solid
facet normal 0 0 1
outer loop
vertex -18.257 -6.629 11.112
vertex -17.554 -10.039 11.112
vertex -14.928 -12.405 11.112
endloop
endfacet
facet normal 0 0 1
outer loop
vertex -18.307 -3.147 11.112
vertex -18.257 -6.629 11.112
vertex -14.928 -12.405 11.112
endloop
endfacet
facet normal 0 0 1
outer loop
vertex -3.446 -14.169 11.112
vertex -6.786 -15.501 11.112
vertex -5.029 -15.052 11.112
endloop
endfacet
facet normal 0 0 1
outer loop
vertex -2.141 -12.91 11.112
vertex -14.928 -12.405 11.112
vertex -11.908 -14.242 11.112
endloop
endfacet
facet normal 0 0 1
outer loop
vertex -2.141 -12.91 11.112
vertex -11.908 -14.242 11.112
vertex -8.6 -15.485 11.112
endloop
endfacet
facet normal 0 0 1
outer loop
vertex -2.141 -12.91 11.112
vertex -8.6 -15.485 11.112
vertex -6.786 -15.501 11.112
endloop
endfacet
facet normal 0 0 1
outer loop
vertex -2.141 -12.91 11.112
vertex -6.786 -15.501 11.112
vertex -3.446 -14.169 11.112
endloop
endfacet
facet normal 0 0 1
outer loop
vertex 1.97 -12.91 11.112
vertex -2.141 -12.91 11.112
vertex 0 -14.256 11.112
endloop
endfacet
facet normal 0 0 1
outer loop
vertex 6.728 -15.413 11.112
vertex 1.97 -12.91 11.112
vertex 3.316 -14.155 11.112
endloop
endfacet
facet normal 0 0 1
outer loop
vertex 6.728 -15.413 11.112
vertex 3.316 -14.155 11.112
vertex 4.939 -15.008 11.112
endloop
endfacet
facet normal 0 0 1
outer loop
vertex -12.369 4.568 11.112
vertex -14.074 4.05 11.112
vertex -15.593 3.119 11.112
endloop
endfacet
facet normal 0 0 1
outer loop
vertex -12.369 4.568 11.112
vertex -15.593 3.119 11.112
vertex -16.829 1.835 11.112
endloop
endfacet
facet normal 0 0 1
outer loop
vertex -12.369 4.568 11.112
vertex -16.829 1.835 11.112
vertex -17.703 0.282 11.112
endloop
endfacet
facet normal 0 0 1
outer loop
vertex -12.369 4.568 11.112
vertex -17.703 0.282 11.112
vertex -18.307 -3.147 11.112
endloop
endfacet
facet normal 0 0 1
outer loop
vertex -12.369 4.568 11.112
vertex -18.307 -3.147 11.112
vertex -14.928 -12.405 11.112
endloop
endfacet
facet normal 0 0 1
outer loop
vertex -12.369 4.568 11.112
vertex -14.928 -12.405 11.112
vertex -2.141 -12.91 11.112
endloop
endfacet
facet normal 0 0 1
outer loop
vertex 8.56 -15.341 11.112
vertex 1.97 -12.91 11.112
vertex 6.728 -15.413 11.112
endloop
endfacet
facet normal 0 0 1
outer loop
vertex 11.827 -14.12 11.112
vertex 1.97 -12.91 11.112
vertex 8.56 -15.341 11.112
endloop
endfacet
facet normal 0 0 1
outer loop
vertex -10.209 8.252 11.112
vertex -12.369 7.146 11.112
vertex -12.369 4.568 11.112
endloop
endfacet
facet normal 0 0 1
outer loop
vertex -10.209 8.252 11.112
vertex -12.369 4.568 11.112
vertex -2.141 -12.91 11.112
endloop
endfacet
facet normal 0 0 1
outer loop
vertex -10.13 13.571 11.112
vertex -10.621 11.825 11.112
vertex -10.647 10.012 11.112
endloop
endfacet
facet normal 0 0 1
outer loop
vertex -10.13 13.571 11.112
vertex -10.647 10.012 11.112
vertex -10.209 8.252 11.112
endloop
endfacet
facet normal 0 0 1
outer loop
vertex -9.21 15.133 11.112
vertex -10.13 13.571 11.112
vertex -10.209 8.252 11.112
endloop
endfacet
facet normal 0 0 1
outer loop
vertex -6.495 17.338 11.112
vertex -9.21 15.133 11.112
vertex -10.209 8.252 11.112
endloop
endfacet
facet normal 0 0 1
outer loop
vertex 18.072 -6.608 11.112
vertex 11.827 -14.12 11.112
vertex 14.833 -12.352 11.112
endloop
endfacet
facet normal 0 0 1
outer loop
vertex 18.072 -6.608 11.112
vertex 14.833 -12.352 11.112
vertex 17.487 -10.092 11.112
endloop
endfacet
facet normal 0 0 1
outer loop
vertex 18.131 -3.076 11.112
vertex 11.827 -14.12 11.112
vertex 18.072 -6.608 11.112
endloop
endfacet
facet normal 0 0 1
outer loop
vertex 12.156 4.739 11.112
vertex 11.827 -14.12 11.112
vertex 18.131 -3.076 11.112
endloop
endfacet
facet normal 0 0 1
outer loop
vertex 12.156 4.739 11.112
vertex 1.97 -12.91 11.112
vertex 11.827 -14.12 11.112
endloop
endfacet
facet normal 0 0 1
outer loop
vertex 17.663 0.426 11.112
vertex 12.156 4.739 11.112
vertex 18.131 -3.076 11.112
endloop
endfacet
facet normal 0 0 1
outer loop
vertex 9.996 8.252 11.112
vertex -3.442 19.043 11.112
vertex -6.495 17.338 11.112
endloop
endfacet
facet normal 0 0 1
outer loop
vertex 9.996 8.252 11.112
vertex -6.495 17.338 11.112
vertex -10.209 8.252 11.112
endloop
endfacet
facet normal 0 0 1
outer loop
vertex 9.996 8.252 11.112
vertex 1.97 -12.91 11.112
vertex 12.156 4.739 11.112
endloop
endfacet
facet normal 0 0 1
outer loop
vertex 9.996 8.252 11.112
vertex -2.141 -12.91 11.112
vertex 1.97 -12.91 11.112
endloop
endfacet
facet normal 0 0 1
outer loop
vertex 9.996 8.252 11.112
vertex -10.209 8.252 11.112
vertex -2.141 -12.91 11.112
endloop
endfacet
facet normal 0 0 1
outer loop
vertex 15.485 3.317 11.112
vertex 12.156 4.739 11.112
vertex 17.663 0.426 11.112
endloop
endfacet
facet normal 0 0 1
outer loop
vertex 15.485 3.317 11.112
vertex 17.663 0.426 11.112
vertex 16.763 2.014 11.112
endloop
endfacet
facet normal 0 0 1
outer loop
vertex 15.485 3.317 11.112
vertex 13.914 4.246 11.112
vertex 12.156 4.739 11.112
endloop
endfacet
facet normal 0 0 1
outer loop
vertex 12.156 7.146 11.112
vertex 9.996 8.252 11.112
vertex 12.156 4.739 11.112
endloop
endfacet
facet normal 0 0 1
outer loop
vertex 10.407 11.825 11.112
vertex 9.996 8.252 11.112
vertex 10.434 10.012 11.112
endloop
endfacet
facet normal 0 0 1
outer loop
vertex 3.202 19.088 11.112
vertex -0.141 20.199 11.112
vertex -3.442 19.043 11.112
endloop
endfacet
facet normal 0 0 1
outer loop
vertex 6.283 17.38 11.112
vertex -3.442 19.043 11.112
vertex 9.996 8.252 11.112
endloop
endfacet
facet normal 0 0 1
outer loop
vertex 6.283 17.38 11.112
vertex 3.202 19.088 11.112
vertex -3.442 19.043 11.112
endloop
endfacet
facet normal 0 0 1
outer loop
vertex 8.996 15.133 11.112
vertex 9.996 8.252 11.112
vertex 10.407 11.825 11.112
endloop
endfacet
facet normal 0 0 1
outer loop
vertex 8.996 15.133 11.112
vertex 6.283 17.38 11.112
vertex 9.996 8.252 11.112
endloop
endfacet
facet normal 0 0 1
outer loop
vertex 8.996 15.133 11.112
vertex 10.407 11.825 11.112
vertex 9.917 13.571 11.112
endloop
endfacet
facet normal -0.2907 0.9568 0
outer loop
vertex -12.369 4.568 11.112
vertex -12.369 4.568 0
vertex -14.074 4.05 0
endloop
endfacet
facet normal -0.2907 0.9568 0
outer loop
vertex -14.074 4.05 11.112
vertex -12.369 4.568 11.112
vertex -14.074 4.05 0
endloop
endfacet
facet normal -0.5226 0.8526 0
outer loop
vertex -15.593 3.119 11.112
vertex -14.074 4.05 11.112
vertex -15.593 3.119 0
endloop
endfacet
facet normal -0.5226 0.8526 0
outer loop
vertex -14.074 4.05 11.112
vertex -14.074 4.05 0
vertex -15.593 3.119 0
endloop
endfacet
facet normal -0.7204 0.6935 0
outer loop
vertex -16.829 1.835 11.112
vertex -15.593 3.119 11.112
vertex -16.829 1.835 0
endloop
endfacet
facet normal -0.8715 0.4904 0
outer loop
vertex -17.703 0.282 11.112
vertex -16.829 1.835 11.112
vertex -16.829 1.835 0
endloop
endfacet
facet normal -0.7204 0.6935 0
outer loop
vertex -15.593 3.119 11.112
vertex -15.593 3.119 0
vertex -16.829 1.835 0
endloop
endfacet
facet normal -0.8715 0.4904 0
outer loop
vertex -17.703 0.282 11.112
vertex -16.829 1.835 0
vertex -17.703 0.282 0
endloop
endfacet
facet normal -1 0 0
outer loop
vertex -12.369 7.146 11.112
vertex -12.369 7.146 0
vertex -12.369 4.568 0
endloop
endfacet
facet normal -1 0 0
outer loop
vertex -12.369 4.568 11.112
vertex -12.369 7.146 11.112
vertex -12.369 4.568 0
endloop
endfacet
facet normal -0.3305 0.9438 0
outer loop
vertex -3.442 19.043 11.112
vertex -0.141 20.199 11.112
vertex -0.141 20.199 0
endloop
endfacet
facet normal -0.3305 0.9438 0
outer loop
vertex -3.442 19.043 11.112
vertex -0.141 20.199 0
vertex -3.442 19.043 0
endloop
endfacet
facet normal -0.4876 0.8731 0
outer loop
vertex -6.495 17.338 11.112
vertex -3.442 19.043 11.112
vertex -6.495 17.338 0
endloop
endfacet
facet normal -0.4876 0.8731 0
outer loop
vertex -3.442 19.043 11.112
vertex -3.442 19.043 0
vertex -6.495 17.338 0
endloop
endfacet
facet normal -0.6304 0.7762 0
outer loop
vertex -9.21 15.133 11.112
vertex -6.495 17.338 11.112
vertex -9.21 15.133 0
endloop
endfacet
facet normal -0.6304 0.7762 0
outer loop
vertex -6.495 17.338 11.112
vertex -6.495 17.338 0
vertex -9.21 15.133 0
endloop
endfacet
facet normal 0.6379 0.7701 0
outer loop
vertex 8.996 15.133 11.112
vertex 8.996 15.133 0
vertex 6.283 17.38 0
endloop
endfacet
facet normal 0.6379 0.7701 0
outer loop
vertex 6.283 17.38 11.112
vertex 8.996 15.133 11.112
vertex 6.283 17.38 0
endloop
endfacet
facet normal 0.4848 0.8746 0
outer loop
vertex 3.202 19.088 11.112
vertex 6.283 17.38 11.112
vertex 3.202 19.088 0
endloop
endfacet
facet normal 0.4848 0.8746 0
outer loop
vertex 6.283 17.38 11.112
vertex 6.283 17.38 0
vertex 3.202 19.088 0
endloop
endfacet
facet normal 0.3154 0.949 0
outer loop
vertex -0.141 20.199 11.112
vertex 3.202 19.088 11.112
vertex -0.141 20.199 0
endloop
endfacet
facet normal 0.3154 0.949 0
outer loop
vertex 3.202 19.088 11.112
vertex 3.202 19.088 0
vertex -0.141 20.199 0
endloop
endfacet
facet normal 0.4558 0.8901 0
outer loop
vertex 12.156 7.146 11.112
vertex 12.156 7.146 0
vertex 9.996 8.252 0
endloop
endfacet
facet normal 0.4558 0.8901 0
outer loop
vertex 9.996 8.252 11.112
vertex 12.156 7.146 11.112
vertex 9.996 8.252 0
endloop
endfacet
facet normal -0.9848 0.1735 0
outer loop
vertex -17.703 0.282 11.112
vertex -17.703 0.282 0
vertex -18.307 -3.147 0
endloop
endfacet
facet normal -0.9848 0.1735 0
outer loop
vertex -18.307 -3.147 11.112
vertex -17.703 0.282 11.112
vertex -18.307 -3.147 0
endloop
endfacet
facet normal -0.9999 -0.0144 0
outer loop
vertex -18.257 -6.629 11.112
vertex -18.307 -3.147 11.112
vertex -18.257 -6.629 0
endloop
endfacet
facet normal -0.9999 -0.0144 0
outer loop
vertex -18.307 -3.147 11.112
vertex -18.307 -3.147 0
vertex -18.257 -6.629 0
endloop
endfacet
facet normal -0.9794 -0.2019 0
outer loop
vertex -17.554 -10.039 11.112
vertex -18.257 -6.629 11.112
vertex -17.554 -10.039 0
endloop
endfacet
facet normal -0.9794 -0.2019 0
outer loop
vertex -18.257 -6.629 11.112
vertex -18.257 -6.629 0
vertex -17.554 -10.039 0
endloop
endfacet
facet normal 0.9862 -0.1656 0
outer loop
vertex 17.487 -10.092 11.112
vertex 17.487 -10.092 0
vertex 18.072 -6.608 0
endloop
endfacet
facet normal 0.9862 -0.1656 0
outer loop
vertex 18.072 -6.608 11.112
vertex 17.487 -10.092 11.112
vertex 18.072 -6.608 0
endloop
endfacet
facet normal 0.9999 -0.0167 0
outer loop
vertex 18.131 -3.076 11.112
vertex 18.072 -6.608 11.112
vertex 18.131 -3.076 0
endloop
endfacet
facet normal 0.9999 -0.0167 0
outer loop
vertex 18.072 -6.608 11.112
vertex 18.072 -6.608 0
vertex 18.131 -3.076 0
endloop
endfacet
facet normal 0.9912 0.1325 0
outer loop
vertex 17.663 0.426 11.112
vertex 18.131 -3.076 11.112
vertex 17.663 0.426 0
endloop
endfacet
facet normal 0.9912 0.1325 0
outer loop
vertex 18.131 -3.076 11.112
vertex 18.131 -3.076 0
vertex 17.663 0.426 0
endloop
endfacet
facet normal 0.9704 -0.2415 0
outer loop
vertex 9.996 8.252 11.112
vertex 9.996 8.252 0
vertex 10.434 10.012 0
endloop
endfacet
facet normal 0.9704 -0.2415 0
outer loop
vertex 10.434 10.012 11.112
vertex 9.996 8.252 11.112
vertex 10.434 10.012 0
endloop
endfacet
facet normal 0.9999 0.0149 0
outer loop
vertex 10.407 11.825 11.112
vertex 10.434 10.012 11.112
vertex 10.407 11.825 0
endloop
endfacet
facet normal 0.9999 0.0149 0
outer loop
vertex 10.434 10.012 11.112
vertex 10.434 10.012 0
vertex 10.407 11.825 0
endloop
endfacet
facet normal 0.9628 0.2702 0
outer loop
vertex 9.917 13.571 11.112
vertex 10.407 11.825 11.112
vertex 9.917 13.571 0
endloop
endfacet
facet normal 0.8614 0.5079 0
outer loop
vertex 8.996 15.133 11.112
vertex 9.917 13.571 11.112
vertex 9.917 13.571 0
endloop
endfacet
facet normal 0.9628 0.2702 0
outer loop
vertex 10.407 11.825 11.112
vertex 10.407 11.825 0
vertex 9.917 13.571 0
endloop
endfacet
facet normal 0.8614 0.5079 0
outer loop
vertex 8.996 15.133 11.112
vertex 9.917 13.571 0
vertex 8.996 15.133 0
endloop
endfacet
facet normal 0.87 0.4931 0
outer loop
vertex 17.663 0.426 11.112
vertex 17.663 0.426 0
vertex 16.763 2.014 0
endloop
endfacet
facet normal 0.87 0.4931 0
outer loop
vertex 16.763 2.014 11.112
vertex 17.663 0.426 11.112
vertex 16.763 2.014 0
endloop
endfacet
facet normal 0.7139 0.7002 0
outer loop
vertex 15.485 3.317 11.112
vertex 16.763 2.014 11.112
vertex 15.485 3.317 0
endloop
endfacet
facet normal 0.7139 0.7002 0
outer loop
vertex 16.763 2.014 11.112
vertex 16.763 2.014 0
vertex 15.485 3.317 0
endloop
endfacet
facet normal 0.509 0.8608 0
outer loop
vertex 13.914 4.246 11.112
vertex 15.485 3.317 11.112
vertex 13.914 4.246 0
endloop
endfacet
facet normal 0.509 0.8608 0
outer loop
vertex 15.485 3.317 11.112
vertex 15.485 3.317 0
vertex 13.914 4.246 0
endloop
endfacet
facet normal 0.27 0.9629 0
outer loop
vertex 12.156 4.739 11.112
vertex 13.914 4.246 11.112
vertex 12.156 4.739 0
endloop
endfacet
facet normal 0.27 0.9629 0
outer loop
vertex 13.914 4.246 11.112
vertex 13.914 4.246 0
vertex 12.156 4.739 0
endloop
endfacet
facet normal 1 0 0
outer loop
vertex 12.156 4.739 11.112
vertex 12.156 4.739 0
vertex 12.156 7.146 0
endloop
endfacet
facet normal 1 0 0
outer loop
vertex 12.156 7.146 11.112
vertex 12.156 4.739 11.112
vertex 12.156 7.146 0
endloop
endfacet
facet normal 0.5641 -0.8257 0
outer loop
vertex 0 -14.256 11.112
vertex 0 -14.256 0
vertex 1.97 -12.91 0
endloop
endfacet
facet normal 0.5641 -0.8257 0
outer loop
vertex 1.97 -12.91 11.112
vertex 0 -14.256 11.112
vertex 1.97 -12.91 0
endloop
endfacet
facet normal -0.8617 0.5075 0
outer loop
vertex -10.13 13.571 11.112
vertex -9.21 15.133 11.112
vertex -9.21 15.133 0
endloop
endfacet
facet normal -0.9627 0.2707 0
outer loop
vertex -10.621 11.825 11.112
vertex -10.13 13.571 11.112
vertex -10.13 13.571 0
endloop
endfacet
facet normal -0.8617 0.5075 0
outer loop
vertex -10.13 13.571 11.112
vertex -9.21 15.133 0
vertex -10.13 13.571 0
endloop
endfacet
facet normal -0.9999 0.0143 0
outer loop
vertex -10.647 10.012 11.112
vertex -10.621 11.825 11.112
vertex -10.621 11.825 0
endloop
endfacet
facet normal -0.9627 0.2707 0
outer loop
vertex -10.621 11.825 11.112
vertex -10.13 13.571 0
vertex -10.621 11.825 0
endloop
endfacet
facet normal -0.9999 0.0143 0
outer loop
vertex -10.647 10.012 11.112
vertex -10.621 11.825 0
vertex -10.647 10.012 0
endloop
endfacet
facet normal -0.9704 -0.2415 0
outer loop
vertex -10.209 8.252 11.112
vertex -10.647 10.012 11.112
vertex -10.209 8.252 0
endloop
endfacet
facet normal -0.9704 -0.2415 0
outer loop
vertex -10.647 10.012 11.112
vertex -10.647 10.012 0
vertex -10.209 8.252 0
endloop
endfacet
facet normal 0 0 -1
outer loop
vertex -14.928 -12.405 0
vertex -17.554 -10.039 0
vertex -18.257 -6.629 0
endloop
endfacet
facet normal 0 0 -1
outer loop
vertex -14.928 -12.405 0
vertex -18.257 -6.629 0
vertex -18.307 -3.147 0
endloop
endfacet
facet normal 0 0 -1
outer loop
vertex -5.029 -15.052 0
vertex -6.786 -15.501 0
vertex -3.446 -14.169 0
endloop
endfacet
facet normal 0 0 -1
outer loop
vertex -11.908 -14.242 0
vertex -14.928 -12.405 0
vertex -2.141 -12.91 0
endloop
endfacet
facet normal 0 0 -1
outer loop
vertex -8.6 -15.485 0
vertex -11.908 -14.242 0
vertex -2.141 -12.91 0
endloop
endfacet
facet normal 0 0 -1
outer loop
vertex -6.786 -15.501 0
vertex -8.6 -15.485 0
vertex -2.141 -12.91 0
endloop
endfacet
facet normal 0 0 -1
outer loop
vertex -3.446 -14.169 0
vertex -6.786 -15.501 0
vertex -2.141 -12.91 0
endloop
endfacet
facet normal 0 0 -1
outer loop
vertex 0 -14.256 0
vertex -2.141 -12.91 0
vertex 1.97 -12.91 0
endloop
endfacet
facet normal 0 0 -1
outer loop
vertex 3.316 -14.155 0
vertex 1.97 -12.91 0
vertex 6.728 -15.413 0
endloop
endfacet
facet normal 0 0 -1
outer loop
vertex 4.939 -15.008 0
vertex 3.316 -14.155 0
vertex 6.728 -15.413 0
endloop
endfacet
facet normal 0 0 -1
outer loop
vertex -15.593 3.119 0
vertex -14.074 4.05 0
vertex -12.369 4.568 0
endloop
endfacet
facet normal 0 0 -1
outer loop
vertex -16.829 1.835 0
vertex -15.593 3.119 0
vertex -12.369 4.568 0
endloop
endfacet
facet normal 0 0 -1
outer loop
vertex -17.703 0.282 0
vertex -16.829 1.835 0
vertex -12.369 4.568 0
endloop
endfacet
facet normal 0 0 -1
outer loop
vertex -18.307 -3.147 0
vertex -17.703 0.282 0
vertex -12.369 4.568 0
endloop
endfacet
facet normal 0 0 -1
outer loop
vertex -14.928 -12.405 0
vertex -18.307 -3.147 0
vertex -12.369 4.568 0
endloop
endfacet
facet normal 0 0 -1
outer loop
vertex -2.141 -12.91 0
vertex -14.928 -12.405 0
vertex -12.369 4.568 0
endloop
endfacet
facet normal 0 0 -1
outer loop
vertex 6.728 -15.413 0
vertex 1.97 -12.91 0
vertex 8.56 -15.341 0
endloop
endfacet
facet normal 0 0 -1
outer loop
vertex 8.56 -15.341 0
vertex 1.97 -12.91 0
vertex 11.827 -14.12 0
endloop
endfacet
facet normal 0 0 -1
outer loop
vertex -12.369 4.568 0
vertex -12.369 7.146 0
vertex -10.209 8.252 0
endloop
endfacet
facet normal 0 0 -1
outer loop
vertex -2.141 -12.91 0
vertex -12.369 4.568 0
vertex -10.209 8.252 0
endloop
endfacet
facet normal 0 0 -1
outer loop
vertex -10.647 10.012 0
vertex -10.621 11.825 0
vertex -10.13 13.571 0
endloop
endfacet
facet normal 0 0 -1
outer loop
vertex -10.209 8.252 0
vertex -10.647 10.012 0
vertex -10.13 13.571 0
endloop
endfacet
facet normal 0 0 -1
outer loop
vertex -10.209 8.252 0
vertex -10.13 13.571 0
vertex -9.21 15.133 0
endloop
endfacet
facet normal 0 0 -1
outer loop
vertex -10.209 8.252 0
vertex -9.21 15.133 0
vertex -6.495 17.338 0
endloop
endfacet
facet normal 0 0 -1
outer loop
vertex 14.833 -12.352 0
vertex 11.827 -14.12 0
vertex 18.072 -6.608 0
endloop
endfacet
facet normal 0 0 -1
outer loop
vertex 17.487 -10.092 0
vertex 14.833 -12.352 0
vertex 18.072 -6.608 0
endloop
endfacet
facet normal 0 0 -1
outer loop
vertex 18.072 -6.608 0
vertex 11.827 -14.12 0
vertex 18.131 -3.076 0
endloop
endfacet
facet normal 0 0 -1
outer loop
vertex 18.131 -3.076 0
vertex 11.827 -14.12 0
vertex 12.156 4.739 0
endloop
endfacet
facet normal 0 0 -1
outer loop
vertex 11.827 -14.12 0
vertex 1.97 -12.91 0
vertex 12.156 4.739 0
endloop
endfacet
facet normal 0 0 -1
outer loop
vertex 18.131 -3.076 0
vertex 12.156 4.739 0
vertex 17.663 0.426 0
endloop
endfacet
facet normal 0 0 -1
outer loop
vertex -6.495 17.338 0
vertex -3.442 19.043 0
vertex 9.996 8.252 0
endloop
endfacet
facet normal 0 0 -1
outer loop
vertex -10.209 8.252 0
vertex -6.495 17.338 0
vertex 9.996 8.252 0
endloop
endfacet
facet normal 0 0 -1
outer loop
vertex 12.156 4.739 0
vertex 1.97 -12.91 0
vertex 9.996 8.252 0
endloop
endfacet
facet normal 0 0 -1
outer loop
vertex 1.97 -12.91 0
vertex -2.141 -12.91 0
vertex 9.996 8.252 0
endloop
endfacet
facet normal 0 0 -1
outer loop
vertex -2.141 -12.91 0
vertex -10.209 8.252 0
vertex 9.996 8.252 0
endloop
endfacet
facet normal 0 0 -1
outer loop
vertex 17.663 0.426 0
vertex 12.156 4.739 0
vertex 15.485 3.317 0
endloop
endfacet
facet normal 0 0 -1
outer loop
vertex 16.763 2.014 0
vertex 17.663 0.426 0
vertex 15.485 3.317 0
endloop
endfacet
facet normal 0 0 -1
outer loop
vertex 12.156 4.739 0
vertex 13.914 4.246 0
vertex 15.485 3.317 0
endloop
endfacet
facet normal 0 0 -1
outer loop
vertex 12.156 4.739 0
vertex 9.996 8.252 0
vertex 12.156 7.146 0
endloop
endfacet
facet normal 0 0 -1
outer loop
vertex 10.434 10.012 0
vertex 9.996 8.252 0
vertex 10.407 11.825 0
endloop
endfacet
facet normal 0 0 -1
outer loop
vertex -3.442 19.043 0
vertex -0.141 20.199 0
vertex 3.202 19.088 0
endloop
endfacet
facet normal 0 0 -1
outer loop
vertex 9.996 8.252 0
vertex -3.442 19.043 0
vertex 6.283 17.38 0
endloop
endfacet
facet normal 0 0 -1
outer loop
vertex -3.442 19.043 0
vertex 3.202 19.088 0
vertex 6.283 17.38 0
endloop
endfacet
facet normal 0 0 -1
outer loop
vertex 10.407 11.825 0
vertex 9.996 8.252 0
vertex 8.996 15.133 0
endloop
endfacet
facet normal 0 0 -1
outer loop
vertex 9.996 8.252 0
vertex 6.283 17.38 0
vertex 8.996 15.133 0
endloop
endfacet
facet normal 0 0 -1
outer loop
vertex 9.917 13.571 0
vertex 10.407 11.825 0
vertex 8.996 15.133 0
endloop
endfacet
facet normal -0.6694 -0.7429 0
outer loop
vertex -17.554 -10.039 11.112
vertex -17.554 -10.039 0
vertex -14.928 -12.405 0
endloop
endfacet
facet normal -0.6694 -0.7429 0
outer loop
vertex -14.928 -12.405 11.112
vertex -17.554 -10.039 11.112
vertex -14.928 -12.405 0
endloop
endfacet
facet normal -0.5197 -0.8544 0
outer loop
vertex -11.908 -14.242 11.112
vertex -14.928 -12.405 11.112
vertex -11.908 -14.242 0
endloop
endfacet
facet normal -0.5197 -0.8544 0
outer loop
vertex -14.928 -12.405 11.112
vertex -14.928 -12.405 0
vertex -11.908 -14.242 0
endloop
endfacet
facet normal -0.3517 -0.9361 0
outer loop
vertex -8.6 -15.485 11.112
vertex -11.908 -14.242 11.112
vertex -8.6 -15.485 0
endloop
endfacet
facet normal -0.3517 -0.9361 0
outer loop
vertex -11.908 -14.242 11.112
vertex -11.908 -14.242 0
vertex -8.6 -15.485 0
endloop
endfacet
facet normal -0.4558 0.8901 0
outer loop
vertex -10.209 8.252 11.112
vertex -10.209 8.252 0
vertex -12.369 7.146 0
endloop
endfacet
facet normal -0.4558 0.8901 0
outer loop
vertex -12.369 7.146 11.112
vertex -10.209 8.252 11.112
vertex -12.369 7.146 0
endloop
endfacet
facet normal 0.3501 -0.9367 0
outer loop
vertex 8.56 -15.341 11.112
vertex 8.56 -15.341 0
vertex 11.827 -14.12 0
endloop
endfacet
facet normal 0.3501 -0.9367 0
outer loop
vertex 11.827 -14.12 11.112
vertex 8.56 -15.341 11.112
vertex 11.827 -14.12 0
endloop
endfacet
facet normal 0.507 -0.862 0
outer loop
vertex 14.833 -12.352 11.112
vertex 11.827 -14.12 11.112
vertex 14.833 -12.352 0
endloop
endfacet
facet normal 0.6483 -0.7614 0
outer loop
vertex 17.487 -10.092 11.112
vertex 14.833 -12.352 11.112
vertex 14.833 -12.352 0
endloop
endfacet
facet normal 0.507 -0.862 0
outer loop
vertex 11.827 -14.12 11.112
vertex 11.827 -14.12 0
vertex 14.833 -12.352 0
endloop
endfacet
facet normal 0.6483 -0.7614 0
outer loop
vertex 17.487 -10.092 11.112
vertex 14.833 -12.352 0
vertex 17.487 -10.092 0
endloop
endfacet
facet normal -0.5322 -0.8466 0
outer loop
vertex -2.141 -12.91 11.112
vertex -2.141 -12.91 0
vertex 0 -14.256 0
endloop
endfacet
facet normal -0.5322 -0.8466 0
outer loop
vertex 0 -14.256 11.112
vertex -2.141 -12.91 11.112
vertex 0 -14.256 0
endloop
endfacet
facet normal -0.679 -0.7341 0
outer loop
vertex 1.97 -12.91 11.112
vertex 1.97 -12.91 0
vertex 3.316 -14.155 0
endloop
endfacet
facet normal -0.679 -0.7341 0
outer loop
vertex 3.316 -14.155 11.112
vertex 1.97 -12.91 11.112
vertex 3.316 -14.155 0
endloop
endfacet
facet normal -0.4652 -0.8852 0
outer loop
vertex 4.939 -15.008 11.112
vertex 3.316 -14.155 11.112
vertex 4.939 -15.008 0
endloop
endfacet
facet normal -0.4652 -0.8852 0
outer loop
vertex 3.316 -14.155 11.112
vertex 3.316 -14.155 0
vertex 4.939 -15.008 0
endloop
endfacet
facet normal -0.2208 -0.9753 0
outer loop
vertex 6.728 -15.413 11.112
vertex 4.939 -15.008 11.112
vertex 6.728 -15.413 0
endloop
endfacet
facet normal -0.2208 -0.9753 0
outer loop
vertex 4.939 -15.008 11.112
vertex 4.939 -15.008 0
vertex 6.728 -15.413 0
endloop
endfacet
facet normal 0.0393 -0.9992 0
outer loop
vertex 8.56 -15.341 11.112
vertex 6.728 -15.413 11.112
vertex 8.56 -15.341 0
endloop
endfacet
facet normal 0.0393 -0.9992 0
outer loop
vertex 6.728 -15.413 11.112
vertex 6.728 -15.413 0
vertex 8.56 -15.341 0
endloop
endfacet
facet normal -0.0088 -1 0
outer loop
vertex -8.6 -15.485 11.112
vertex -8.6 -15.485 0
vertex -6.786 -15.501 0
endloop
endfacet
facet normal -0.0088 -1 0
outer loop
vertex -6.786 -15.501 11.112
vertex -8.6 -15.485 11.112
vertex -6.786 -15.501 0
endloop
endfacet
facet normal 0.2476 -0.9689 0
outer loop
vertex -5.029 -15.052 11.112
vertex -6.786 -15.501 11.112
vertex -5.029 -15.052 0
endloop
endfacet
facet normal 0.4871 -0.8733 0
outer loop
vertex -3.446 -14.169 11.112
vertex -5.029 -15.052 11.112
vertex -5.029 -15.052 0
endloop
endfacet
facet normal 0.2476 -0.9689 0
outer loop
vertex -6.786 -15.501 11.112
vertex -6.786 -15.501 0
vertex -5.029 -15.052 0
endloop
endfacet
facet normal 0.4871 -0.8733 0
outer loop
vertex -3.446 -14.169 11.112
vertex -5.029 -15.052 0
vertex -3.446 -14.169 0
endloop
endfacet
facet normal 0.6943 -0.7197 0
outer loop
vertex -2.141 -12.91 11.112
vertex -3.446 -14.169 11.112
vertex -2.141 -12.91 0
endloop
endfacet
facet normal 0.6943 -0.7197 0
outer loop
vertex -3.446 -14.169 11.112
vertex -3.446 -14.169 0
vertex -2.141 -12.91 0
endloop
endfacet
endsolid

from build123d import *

# Parameters (mm, degrees)
F1_DEPTH = 11.1125


# Not quite as in the source:
# - a length typed as a fraction of an inch, garbled in the dataset ("3 / 203.2 mm" for 3/8 in), is restored


with BuildPart() as f1:
    # F0 (on Top) → F1 (new body)
    with BuildSketch(Plane.XY):
        with BuildLine():
            ThreePointArc((-0.1411418198, 20.1985444874), (-5.0054503986, 18.2564119782), (-9.2097157612, 15.1327075437))
            ThreePointArc((-9.2097157612, 15.1327075437), (-10.6205392688, 11.8246856933), (-10.2093555033, 8.2519613206))
            Line((-10.2093555033, 8.2519613206), (-12.369341217, 7.1464567445))
            Line((-12.369341217, 7.1464567445), (-12.369341217, 4.6386048198))
            Line((-12.369341217, 4.6386048198), (-12.369341217, 4.5682978211))
            ThreePointArc((-12.369341217, 4.5682978211), (-15.5930977879, 3.1185654947), (-17.7027139134, 0.2823972963))
            ThreePointArc((-17.7027139134, 0.2823972963), (-18.3641606661, -4.889059653), (-17.5542831421, -10.0393583998))
            ThreePointArc((-17.5542831421, -10.0393583998), (-13.4613837791, -13.3941238354), (-8.5996589687, -15.484556372))
            ThreePointArc((-8.5996589687, -15.484556372), (-5.0294162563, -15.0523544446), (-2.1409380715, -12.9098966718))
            Line((-2.1409380715, -12.9098966718), (0, -14.2561570176))
            Line((0, -14.2561570176), (1.9696742658, -12.9098966718))
            ThreePointArc((1.9696742658, -12.9098966718), (4.9392756736, -15.0084468105), (8.560301624, -15.3410370587))
            ThreePointArc((8.560301624, -15.3410370587), (13.367982191, -13.3015402533), (17.4874793738, -10.0916987285))
            ThreePointArc((17.4874793738, -10.0916987285), (18.16772005, -4.8427956267), (17.6633565687, 0.4259166096))
            ThreePointArc((17.6633565687, 0.4259166096), (15.4847616458, 3.3168082822), (12.1560195839, 4.739132713))
            Line((12.1560195839, 4.739132713), (12.1560195839, 7.1464567445))
            Line((12.1560195839, 7.1464567445), (9.9960338703, 8.2519613206))
            ThreePointArc((9.9960338703, 8.2519613206), (10.4072176357, 11.8246856933), (8.9963941282, 15.1327075437))
            ThreePointArc((8.9963941282, 15.1327075437), (4.7823081966, 18.3053860292), (-0.1411418198, 20.1985444874))
        make_face()
    extrude(amount=F1_DEPTH)


solid = f1.part
